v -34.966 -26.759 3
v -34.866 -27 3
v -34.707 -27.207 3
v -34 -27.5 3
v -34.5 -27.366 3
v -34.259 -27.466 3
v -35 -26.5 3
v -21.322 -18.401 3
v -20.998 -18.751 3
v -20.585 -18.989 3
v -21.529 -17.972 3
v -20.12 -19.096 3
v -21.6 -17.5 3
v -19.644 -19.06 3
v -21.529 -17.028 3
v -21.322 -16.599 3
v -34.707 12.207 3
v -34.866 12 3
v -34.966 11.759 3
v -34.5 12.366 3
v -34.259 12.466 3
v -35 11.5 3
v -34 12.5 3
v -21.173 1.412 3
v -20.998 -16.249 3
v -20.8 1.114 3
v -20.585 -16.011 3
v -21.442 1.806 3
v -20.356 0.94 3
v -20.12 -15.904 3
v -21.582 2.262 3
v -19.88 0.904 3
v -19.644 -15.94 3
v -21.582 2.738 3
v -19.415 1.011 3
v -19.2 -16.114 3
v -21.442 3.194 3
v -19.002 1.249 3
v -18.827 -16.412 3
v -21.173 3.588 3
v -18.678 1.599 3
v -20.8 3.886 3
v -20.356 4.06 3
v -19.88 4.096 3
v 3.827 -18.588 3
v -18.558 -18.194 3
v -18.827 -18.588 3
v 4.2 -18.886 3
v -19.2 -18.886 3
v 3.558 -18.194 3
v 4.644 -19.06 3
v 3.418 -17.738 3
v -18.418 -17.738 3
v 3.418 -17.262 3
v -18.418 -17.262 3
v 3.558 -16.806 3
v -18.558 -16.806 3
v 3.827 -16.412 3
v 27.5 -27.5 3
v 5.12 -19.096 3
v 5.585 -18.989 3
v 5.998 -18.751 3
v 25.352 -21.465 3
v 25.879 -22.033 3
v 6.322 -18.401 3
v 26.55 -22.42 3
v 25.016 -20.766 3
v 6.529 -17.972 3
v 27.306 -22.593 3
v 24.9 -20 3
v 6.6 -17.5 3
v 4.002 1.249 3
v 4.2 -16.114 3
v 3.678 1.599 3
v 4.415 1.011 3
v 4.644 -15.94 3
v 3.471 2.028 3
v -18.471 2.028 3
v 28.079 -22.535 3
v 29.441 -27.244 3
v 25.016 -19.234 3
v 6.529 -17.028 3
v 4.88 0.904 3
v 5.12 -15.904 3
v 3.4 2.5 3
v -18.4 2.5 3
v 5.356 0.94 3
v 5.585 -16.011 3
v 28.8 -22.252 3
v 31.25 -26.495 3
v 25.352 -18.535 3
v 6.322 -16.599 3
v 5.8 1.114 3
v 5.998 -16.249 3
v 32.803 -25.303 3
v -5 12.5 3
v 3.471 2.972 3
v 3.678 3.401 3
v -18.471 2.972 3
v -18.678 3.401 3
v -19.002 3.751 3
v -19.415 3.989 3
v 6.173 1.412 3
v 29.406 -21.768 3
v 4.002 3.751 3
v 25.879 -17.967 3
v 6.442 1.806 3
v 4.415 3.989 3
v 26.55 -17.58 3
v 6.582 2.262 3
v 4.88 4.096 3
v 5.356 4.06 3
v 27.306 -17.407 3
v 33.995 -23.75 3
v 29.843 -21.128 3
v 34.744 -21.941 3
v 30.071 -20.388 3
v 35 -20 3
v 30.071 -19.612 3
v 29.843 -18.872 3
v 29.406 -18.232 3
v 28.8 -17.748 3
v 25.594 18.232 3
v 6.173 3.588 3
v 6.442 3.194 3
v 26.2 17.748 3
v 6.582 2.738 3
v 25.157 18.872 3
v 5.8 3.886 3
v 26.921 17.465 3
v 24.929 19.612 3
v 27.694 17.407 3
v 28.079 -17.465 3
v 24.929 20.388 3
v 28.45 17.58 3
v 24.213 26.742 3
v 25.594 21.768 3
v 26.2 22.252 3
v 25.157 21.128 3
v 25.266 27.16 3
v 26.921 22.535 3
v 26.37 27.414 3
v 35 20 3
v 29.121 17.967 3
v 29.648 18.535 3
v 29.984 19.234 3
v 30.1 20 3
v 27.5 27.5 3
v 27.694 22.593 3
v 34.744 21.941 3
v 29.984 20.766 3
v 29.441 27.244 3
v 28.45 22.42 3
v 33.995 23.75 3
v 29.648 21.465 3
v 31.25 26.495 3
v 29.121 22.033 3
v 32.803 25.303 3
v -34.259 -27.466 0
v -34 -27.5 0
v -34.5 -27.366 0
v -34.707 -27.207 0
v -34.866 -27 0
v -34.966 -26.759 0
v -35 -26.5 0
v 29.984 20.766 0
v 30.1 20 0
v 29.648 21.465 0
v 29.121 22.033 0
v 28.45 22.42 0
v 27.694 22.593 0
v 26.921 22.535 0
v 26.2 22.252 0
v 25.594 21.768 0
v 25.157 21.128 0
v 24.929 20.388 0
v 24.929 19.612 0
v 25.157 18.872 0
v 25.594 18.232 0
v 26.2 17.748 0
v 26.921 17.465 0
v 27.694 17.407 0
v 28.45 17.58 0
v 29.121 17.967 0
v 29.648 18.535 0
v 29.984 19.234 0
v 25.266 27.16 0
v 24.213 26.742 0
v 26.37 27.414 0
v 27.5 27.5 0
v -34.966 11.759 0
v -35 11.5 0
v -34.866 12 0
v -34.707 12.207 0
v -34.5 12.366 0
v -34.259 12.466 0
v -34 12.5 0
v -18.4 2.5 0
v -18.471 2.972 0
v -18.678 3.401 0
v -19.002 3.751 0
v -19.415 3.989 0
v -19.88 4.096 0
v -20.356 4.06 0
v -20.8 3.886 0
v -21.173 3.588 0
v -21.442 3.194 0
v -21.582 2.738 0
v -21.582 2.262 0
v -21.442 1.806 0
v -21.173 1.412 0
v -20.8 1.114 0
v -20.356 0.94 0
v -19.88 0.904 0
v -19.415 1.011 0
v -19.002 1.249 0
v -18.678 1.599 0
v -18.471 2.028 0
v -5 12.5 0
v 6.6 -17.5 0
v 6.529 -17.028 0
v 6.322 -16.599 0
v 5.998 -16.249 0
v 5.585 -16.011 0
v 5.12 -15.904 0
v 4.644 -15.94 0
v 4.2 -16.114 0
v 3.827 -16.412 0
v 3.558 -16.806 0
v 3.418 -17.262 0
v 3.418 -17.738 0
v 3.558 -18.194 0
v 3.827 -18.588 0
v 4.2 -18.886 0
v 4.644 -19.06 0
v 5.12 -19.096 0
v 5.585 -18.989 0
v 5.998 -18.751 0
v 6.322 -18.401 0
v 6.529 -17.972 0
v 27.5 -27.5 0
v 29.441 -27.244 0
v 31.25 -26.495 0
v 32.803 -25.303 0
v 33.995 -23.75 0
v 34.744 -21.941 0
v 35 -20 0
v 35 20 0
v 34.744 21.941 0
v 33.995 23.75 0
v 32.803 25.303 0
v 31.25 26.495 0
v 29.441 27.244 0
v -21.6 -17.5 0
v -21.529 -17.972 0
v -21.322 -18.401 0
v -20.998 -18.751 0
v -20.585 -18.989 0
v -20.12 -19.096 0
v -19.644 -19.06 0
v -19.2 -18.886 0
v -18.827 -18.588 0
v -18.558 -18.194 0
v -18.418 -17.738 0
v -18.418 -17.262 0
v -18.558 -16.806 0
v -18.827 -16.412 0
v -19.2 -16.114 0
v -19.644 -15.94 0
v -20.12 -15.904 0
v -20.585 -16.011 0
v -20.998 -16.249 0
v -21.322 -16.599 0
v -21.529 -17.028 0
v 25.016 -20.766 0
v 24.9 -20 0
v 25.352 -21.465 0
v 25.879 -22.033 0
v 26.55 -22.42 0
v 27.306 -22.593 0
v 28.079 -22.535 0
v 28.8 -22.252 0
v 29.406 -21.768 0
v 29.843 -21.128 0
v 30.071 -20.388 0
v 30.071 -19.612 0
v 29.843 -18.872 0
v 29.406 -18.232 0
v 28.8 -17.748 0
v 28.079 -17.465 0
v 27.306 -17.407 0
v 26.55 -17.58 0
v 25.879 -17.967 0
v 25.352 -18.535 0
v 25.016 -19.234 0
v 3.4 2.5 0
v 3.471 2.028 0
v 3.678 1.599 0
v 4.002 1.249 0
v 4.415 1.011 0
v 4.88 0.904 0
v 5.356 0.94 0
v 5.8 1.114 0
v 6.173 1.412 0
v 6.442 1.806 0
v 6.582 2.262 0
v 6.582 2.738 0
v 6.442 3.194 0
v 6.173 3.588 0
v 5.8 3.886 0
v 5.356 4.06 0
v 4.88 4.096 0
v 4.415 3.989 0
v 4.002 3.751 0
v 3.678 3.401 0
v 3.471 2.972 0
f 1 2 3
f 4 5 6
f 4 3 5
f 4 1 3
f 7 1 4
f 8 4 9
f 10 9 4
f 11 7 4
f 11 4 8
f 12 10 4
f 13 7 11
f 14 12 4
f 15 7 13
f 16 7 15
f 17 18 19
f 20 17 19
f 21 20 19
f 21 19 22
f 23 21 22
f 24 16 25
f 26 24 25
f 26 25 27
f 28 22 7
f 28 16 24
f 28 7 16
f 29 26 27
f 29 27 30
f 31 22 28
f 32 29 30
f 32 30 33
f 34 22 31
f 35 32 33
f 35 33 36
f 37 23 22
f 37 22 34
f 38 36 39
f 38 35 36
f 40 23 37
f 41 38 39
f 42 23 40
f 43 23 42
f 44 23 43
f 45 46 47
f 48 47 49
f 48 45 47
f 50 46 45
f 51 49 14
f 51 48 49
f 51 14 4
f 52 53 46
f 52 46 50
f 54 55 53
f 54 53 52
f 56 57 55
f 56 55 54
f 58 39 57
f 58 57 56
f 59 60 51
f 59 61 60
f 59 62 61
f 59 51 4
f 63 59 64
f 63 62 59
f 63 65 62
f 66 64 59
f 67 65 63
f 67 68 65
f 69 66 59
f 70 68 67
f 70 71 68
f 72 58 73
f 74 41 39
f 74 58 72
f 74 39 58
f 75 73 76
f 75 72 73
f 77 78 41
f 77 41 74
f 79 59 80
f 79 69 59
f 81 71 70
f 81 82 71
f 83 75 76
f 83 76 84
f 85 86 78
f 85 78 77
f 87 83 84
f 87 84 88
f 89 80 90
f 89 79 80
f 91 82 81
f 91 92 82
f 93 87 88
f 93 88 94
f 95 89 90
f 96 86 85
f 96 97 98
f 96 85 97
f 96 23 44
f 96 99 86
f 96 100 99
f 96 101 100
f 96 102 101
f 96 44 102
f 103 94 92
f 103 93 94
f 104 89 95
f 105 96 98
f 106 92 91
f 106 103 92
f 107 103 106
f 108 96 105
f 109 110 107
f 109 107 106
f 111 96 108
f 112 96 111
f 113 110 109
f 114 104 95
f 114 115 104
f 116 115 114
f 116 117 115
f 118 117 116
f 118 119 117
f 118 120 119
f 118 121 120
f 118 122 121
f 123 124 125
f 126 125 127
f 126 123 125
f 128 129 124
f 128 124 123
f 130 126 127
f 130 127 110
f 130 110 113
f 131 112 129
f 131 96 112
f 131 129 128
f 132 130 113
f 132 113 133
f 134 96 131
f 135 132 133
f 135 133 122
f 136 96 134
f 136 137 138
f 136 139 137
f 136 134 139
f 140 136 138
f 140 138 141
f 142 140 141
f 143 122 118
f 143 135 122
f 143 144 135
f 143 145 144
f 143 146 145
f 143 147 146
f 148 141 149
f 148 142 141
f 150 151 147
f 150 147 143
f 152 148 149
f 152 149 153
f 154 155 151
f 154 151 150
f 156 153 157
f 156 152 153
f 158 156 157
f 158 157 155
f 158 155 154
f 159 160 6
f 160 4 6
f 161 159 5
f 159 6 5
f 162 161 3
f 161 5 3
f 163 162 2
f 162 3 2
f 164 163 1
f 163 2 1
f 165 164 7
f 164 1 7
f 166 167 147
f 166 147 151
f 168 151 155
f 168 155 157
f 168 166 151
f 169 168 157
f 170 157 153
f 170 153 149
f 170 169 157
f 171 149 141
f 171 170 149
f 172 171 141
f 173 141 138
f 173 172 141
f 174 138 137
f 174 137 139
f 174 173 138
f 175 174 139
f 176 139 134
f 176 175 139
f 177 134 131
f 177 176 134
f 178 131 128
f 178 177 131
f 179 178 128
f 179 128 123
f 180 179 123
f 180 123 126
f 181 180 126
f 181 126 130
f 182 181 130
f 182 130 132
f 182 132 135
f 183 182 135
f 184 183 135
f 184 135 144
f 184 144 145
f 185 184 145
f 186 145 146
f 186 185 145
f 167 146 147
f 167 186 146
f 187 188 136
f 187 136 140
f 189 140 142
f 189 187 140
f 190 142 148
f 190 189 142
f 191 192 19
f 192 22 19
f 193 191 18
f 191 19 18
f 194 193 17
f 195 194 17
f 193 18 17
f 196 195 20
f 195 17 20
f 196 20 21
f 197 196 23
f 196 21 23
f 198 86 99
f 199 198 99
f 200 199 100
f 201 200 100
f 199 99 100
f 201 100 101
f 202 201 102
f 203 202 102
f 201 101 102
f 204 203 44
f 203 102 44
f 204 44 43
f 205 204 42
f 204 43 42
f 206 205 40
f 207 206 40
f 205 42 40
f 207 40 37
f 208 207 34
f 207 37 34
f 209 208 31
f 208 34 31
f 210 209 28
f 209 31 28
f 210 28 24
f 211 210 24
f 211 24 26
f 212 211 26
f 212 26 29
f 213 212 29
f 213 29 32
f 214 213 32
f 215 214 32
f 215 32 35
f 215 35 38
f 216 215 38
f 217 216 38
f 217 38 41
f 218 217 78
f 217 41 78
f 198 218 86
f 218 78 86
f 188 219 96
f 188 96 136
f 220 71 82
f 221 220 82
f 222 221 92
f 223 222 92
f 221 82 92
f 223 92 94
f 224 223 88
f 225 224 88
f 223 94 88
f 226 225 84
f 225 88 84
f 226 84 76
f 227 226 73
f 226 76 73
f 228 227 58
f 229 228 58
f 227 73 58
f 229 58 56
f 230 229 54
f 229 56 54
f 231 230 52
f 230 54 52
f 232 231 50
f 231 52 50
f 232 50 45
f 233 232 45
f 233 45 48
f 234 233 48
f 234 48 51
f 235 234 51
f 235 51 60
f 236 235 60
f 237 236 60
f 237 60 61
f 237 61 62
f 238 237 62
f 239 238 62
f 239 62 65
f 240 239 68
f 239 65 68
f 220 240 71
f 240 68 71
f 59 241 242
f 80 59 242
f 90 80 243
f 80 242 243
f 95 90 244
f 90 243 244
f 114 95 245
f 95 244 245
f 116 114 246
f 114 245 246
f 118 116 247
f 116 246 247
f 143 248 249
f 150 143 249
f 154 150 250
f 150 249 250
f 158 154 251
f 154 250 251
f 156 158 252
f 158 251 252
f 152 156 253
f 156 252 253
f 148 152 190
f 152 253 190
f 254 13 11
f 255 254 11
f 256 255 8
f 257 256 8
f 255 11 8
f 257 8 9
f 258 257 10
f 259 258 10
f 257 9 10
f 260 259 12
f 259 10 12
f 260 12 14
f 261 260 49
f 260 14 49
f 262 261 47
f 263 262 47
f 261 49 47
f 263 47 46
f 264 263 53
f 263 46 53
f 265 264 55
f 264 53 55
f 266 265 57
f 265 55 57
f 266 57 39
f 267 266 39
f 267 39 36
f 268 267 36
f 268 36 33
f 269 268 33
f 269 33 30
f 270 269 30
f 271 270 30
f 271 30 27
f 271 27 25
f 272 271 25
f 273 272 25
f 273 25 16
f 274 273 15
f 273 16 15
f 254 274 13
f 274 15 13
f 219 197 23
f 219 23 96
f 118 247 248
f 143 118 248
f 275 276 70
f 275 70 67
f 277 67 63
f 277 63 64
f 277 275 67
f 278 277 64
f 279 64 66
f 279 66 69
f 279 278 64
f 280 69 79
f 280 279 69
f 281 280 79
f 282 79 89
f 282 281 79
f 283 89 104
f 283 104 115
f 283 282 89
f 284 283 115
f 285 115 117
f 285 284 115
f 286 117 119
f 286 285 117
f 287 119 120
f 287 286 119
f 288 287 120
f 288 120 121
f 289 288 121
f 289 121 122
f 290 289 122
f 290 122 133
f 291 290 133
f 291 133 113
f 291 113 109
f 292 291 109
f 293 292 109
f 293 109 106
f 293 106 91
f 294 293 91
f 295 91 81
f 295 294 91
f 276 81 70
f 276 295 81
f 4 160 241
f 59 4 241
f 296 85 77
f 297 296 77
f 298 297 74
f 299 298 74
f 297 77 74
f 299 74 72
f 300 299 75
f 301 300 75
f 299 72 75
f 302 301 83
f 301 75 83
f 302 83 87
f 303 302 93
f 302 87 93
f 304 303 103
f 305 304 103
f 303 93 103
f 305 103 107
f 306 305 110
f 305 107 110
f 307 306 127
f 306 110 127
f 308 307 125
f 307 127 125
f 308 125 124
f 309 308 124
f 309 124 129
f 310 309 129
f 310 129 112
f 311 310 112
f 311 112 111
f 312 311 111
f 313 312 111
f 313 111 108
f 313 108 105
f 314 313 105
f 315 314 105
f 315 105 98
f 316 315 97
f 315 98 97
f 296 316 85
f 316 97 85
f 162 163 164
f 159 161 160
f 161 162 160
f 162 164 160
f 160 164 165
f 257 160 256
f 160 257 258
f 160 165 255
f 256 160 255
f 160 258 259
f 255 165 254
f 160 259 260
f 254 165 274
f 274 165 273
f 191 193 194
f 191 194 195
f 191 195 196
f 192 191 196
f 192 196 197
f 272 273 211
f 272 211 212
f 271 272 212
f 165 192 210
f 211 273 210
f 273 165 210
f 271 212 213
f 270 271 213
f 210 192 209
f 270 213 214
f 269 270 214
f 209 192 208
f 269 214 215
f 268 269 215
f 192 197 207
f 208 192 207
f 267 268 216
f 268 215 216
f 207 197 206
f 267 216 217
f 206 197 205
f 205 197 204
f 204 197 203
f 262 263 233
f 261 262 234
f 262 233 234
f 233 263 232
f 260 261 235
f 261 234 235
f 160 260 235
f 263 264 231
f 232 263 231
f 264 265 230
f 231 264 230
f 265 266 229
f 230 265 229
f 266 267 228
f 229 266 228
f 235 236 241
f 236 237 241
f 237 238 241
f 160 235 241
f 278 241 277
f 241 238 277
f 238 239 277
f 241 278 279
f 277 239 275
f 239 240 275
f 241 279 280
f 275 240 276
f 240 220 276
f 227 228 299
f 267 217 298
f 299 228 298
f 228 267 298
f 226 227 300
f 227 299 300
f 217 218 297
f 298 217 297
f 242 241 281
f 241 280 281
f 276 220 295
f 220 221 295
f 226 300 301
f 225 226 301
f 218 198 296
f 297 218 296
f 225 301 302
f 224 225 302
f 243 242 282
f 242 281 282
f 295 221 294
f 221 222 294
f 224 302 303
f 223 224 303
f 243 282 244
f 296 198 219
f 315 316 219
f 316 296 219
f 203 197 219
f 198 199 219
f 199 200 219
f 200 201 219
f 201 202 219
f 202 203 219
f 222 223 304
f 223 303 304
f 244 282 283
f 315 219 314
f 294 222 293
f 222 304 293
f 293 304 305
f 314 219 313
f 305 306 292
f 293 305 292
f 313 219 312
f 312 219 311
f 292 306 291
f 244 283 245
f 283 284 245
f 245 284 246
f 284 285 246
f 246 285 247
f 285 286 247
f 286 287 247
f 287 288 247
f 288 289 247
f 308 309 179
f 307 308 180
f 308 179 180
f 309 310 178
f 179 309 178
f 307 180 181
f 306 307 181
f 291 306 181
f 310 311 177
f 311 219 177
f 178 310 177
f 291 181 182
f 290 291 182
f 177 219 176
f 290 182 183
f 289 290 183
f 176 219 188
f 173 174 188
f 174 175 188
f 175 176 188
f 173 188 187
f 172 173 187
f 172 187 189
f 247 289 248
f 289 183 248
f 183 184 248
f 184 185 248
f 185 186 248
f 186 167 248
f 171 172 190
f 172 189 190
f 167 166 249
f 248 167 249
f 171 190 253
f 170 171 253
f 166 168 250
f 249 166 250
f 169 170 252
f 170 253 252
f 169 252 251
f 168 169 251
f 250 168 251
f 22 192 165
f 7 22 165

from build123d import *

# Parameters (mm, degrees)
SKETCH_1_R          = 2.6
EXTRUDE_1_DEPTH     = 3
CUT_EXTRUDE_START   = -3
CUT_EXTRUDE_1_DEPTH = 3
SKETCH_3_R          = 1.6
CUT_EXTRUDE_2_DEPTH = 3
FILLET_1_R          = 1


with BuildPart() as part:
    # 草图1 → 凸台-拉伸1 (new body)
    with BuildSketch(Plane.XY):
        with BuildLine():
            Line((-35, -27.5), (27.5, -27.5))
            ThreePointArc((27.5, -27.5), (32.803300859, -25.303300859), (35, -20))
            Line((35, -20), (35, 20))
            ThreePointArc((35, 20), (32.803300859, 25.303300859), (27.5, 27.5))
            Line((27.5, 27.5), (-35, 27.5))
            Line((-35, 27.5), (-35, -27.5))
        make_face()
        with Locations((27.5, 20)):
            Circle(SKETCH_1_R, mode=Mode.SUBTRACT)
        with Locations(Location((27.5, -20, 0), (0, 0, 180))):
            Circle(SKETCH_1_R, mode=Mode.SUBTRACT)
    extrude(amount=EXTRUDE_1_DEPTH)

    # 草图2 → 切除-拉伸1 (cut)
    with BuildSketch(Plane.XY.offset(3).offset(CUT_EXTRUDE_START)):
        with BuildLine():
            Line((-35, 12.5), (-5, 12.5))
            Line((-5, 12.5), (24.213483146, 26.741573034))
            ThreePointArc((24.213483146, 26.741573034), (25.8135537, 27.307933968), (27.5, 27.5))
            Line((27.5, 27.5), (27.5, 37.5))
            Line((27.5, 37.5), (-35, 37.5))
            Line((-35, 37.5), (-35, 12.5))
        make_face()
    extrude(amount=CUT_EXTRUDE_1_DEPTH, mode=Mode.SUBTRACT)

    # 草图3 → 切除-拉伸2 (cut)
    with BuildSketch(Plane.XY.offset(3)):
        with Locations((-20, 2.5)):
            Circle(SKETCH_3_R)
        with Locations(Location((5, 2.5, 0), (0, 0, 180))):
            Circle(SKETCH_3_R)
        with Locations((5, -17.5)):
            Circle(SKETCH_3_R)
        with Locations(Location((-20, -17.5, 0), (0, 0, 180))):
            Circle(SKETCH_3_R)
    extrude(amount=-CUT_EXTRUDE_2_DEPTH, mode=Mode.SUBTRACT)

    # 圆角1
    fillet_1_edges = [part.edges().sort_by_distance(p)[0] for p in [
        (-35, -27.5, 1.5),
        (-35, 12.5, 1.5),
    ]]
    fillet(fillet_1_edges, radius=FILLET_1_R)


solid = part.part
